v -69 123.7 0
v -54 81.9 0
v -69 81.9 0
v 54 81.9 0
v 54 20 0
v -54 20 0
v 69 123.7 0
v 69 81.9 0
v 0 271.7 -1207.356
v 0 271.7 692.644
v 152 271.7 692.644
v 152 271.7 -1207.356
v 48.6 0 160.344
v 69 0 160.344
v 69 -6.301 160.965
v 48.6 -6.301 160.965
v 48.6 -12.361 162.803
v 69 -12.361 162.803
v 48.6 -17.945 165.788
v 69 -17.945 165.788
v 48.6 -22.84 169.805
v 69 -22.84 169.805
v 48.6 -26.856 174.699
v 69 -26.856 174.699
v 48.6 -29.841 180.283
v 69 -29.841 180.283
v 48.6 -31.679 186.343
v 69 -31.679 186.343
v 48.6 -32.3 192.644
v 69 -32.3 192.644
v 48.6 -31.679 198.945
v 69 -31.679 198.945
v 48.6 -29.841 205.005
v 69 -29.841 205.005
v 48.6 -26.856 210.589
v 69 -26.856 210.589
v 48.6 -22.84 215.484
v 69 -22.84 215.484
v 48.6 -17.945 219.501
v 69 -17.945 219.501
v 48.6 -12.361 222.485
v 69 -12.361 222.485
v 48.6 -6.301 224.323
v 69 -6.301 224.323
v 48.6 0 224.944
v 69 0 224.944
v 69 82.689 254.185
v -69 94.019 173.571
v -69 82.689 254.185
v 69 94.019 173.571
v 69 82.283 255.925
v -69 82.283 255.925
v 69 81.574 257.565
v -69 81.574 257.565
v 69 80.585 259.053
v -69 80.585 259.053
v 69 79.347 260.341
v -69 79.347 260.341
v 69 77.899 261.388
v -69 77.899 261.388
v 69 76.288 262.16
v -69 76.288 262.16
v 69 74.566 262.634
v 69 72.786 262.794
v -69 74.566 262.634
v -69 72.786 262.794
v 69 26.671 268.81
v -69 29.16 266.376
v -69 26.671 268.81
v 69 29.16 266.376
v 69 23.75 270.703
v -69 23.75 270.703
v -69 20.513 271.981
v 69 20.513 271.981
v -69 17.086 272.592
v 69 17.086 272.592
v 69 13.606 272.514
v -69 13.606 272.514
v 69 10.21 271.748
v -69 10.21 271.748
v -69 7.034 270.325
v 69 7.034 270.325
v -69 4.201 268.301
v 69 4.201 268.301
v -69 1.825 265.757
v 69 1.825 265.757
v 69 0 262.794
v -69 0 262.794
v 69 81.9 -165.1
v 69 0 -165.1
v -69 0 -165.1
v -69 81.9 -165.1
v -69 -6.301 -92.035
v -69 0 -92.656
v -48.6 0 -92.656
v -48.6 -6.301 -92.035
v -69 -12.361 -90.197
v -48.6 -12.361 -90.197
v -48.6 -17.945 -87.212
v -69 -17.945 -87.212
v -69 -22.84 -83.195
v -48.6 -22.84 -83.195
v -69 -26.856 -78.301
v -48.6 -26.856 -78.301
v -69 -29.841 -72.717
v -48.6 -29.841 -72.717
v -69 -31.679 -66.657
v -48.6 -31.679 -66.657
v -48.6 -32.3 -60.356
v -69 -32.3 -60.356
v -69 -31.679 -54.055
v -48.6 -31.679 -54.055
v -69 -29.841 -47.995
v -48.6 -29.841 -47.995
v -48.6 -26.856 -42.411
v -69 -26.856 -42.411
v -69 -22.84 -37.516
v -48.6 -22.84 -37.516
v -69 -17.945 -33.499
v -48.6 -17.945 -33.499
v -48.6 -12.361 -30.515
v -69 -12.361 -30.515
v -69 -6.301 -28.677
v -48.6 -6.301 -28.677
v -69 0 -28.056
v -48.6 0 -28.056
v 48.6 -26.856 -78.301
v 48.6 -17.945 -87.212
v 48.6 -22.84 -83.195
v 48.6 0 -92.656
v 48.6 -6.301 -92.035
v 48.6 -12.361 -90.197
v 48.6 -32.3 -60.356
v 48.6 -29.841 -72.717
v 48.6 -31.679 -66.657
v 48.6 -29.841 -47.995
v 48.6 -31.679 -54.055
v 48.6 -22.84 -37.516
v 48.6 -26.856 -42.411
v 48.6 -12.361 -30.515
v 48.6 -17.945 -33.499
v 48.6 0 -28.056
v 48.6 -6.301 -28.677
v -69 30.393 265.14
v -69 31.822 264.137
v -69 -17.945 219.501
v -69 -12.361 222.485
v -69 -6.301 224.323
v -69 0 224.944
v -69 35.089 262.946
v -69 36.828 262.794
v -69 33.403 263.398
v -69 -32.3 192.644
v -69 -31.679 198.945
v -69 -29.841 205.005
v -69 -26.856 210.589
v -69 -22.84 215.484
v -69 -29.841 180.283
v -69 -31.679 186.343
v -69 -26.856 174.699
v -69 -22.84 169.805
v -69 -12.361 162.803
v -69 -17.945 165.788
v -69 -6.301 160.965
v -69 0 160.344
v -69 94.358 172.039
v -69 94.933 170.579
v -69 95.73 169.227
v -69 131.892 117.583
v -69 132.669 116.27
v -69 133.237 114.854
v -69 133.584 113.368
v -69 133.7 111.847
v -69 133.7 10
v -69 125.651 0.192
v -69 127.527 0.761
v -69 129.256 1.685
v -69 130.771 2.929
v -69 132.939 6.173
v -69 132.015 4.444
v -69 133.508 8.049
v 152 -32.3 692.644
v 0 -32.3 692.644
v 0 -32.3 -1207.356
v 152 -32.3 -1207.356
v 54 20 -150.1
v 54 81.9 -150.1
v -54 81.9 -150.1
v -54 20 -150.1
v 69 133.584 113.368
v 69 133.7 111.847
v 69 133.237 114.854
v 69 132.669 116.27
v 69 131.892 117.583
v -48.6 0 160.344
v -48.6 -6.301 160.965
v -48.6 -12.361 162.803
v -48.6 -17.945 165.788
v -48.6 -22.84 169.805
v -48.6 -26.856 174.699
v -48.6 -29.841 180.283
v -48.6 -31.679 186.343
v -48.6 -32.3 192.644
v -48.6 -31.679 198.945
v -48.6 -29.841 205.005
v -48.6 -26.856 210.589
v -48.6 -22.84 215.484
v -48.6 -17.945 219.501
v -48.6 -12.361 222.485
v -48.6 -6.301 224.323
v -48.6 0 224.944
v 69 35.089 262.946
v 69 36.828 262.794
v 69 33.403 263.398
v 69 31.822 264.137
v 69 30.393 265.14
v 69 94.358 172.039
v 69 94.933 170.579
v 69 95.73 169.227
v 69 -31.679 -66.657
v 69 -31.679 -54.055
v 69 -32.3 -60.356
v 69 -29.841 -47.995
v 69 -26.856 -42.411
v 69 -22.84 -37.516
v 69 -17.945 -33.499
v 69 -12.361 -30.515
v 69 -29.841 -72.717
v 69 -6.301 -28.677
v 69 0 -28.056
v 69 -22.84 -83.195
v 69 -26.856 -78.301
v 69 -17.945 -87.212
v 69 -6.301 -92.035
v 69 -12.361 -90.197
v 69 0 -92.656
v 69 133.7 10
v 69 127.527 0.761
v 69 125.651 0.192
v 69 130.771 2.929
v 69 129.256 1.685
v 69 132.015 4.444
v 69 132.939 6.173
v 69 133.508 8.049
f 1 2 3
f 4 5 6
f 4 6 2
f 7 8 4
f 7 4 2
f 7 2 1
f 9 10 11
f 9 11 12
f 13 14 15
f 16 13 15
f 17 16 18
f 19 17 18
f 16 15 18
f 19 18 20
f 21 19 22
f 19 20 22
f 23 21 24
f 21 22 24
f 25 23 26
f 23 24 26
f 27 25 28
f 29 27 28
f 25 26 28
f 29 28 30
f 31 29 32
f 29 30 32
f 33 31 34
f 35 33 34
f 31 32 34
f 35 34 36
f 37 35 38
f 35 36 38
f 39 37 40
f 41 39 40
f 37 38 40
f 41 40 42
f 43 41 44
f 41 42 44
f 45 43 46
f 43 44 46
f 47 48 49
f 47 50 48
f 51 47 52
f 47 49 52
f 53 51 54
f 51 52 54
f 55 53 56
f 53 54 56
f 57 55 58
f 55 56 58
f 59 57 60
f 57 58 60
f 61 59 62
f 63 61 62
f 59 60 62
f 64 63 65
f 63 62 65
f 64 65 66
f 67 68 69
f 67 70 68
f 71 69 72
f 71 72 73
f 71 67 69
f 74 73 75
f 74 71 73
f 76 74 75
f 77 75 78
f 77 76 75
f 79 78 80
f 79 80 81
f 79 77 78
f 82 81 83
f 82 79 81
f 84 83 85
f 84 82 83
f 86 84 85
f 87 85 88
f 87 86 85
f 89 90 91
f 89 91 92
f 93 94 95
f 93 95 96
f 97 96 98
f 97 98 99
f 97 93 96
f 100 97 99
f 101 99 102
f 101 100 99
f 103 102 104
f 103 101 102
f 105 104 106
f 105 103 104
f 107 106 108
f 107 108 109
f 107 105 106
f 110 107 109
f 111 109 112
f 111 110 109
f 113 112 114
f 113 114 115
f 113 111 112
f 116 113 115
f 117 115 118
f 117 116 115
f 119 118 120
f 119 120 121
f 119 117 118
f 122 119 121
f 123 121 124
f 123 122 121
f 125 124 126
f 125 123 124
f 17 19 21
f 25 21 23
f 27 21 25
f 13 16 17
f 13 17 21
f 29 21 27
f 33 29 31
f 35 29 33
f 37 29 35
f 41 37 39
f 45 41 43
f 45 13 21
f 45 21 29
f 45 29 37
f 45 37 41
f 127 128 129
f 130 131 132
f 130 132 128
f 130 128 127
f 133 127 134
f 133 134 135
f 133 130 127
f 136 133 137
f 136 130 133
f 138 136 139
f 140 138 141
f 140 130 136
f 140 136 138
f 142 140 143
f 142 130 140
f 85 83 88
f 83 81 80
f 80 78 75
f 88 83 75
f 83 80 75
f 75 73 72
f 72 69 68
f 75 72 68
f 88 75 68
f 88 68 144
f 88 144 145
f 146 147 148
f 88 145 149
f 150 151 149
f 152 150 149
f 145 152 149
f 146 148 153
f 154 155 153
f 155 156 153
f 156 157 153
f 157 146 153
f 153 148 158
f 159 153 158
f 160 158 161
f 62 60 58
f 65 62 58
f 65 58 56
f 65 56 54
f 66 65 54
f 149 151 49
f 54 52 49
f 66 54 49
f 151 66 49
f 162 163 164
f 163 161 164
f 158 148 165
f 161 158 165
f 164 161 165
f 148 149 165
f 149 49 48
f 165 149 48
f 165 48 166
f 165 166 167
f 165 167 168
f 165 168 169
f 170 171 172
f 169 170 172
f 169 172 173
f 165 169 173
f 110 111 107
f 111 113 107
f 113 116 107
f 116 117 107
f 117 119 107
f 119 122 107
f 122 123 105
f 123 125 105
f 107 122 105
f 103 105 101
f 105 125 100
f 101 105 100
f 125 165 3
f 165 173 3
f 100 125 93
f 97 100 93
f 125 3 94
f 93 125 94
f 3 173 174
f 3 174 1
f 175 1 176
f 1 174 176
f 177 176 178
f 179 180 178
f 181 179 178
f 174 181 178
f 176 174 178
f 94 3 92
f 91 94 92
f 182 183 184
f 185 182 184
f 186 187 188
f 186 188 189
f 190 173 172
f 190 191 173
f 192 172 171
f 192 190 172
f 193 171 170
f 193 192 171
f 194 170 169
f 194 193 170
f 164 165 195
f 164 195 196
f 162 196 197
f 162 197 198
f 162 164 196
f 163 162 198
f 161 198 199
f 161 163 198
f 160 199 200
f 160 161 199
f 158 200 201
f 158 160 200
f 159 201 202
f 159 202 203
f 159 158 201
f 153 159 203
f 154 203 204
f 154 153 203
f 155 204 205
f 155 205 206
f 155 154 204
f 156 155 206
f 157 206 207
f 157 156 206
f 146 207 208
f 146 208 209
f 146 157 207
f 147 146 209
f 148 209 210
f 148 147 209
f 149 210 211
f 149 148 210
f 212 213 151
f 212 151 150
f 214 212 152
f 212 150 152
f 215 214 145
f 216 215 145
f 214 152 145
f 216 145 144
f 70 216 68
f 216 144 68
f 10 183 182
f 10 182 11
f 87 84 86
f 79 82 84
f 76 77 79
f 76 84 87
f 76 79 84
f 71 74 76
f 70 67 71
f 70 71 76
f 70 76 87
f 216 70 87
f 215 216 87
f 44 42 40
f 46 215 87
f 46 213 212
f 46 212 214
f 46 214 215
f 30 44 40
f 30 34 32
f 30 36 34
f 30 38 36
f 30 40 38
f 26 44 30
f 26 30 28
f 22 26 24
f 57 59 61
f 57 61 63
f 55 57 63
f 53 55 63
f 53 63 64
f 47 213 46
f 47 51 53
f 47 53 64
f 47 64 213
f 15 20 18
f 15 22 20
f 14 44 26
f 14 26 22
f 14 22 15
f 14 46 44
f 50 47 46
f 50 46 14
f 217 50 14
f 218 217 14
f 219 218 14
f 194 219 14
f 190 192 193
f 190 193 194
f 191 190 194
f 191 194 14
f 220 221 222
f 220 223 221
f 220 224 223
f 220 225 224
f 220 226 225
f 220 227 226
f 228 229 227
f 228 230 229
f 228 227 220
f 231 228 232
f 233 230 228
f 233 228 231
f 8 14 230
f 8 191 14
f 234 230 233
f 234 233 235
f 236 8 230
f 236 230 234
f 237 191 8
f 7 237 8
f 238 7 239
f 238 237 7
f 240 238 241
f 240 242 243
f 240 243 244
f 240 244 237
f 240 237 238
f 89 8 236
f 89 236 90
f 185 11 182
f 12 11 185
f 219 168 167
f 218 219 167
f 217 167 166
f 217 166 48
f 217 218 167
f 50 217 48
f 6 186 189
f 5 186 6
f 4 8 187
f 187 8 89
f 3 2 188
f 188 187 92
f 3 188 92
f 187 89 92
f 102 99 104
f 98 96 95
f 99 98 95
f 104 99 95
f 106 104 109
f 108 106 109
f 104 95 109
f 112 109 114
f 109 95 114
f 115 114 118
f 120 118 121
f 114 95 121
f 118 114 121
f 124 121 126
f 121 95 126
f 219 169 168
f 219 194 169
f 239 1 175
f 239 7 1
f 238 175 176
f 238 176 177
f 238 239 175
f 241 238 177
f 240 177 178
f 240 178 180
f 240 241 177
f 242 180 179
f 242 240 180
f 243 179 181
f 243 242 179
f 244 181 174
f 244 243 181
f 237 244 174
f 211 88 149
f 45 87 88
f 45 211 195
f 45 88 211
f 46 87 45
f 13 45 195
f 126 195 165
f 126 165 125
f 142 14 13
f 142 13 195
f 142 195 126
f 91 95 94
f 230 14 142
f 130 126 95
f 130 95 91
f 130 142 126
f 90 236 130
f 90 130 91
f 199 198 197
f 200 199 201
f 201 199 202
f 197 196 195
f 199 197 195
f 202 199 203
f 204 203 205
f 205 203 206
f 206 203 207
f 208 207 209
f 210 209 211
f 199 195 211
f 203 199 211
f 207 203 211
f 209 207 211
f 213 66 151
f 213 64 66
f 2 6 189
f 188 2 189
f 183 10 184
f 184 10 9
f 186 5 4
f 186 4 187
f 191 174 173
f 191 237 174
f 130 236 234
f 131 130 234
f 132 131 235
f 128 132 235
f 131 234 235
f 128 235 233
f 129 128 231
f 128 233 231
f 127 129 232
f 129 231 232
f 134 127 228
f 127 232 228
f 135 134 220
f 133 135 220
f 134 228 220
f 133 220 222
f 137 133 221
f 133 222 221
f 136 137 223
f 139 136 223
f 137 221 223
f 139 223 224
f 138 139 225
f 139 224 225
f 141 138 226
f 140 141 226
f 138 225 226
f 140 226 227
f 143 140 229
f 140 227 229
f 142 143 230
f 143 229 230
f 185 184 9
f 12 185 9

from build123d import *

# Parameters (mm, degrees)
BOSS_EXTRUDE1_DEPTH = 69
SKETCH4_W           = 15
SKETCH4_H           = 150.1
BOSS_EXTRUDE2_DEPTH = 61.9
BOSS_EXTRUDE3_DEPTH = 20.4
FILLET1_R           = 10
SKETCH6_W           = 1900
SKETCH6_H           = 304
BOSS_EXTRUDE4_DEPTH = 152


with BuildPart() as part:
    # Sketch2 → Boss-Extrude1 (new body, symmetric)
    with BuildSketch(Plane(origin=(0, 0, 0), x_dir=(0, 0, -1), z_dir=(1, 0, 0))):
        with BuildLine():
            Line((-262.793626597, 0), (0, 0))
            Line((0, 0), (165.1, 0))
            Line((165.1, 0), (165.1, 81.9))
            Line((165.1, 81.9), (150.1, 81.9))
            Line((150.1, 81.9), (150.1, 20))
            Line((150.1, 20), (0, 20))
            Line((0, 20), (0, 133.7))
            Line((0, 133.7), (-115, 133.7))
            Line((-115, 133.7), (-171.193830238, 94.352656466))
            Line((-171.193830238, 94.352656466), (-262.793626597, 81.479144628))
            Line((-262.793626597, 81.479144628), (-262.793626597, 31.479144628))
            ThreePointArc((-262.793626597, 31.479144628), (-272.644060375, 15.739572314), (-262.793626597, 0))
        make_face()
    extrude(amount=BOSS_EXTRUDE1_DEPTH, both=True)

    # Sketch4 → Boss-Extrude2 (add)
    with BuildSketch(Plane(origin=(0, 20, 0), x_dir=(1, 0, 0), z_dir=(0, 1, 0))):
        with Locations((61.5, 75.05)):
            Rectangle(SKETCH4_W, SKETCH4_H)
    boss_extrude2 = extrude(amount=BOSS_EXTRUDE2_DEPTH)

    # Mirror1: Boss-Extrude2 across plane
    add(boss_extrude2.mirror(Plane(origin=(0, 0, 0), x_dir=(0, 0, 1), z_dir=(1, 0, 0))))

    # Sketch5 → Boss-Extrude3 (add)
    with BuildSketch(Plane(origin=(69, 0, 0), x_dir=(0, 0, -1), z_dir=(1, 0, 0))):
        with BuildLine():
            Line((-224.944060375, 0), (-160.344060375, 0))
            ThreePointArc((-160.344060375, 0), (-192.644060375, -32.3), (-224.944060375, 0))
        make_face()
        with BuildLine():
            Line((28.055939625, 0), (92.655939625, 0))
            ThreePointArc((92.655939625, 0), (60.355939625, -32.3), (28.055939625, 0))
        make_face()
    boss_extrude3 = extrude(amount=-BOSS_EXTRUDE3_DEPTH)

    # Mirror2: Boss-Extrude3 across plane
    add(boss_extrude3.mirror(Plane(origin=(0, 0, 0), x_dir=(0, 0, 1), z_dir=(1, 0, 0))))

    # Fillet1
    fillet1_edges = [part.edges().sort_by_distance(p)[0] for p in [
        (0, 31.479144628, 262.793626597),
        (0, 81.479144628, 262.793626597),
        (0, 94.352656466, 171.193830238),
        (0, 133.7, 115),
        (0, 133.7, 0),
    ]]
    fillet(fillet1_edges, radius=FILLET1_R)


with BuildPart() as body_2:
    # Sketch6 → Boss-Extrude4 (new body)
    with BuildSketch(Plane(origin=(0, 0, 0), x_dir=(0, 0, -1), z_dir=(1, 0, 0))):
        with Locations((257.355939625, 119.7)):
            Rectangle(SKETCH6_W, SKETCH6_H)
    extrude(amount=BOSS_EXTRUDE4_DEPTH)


solid = Compound([part.part, body_2.part])
